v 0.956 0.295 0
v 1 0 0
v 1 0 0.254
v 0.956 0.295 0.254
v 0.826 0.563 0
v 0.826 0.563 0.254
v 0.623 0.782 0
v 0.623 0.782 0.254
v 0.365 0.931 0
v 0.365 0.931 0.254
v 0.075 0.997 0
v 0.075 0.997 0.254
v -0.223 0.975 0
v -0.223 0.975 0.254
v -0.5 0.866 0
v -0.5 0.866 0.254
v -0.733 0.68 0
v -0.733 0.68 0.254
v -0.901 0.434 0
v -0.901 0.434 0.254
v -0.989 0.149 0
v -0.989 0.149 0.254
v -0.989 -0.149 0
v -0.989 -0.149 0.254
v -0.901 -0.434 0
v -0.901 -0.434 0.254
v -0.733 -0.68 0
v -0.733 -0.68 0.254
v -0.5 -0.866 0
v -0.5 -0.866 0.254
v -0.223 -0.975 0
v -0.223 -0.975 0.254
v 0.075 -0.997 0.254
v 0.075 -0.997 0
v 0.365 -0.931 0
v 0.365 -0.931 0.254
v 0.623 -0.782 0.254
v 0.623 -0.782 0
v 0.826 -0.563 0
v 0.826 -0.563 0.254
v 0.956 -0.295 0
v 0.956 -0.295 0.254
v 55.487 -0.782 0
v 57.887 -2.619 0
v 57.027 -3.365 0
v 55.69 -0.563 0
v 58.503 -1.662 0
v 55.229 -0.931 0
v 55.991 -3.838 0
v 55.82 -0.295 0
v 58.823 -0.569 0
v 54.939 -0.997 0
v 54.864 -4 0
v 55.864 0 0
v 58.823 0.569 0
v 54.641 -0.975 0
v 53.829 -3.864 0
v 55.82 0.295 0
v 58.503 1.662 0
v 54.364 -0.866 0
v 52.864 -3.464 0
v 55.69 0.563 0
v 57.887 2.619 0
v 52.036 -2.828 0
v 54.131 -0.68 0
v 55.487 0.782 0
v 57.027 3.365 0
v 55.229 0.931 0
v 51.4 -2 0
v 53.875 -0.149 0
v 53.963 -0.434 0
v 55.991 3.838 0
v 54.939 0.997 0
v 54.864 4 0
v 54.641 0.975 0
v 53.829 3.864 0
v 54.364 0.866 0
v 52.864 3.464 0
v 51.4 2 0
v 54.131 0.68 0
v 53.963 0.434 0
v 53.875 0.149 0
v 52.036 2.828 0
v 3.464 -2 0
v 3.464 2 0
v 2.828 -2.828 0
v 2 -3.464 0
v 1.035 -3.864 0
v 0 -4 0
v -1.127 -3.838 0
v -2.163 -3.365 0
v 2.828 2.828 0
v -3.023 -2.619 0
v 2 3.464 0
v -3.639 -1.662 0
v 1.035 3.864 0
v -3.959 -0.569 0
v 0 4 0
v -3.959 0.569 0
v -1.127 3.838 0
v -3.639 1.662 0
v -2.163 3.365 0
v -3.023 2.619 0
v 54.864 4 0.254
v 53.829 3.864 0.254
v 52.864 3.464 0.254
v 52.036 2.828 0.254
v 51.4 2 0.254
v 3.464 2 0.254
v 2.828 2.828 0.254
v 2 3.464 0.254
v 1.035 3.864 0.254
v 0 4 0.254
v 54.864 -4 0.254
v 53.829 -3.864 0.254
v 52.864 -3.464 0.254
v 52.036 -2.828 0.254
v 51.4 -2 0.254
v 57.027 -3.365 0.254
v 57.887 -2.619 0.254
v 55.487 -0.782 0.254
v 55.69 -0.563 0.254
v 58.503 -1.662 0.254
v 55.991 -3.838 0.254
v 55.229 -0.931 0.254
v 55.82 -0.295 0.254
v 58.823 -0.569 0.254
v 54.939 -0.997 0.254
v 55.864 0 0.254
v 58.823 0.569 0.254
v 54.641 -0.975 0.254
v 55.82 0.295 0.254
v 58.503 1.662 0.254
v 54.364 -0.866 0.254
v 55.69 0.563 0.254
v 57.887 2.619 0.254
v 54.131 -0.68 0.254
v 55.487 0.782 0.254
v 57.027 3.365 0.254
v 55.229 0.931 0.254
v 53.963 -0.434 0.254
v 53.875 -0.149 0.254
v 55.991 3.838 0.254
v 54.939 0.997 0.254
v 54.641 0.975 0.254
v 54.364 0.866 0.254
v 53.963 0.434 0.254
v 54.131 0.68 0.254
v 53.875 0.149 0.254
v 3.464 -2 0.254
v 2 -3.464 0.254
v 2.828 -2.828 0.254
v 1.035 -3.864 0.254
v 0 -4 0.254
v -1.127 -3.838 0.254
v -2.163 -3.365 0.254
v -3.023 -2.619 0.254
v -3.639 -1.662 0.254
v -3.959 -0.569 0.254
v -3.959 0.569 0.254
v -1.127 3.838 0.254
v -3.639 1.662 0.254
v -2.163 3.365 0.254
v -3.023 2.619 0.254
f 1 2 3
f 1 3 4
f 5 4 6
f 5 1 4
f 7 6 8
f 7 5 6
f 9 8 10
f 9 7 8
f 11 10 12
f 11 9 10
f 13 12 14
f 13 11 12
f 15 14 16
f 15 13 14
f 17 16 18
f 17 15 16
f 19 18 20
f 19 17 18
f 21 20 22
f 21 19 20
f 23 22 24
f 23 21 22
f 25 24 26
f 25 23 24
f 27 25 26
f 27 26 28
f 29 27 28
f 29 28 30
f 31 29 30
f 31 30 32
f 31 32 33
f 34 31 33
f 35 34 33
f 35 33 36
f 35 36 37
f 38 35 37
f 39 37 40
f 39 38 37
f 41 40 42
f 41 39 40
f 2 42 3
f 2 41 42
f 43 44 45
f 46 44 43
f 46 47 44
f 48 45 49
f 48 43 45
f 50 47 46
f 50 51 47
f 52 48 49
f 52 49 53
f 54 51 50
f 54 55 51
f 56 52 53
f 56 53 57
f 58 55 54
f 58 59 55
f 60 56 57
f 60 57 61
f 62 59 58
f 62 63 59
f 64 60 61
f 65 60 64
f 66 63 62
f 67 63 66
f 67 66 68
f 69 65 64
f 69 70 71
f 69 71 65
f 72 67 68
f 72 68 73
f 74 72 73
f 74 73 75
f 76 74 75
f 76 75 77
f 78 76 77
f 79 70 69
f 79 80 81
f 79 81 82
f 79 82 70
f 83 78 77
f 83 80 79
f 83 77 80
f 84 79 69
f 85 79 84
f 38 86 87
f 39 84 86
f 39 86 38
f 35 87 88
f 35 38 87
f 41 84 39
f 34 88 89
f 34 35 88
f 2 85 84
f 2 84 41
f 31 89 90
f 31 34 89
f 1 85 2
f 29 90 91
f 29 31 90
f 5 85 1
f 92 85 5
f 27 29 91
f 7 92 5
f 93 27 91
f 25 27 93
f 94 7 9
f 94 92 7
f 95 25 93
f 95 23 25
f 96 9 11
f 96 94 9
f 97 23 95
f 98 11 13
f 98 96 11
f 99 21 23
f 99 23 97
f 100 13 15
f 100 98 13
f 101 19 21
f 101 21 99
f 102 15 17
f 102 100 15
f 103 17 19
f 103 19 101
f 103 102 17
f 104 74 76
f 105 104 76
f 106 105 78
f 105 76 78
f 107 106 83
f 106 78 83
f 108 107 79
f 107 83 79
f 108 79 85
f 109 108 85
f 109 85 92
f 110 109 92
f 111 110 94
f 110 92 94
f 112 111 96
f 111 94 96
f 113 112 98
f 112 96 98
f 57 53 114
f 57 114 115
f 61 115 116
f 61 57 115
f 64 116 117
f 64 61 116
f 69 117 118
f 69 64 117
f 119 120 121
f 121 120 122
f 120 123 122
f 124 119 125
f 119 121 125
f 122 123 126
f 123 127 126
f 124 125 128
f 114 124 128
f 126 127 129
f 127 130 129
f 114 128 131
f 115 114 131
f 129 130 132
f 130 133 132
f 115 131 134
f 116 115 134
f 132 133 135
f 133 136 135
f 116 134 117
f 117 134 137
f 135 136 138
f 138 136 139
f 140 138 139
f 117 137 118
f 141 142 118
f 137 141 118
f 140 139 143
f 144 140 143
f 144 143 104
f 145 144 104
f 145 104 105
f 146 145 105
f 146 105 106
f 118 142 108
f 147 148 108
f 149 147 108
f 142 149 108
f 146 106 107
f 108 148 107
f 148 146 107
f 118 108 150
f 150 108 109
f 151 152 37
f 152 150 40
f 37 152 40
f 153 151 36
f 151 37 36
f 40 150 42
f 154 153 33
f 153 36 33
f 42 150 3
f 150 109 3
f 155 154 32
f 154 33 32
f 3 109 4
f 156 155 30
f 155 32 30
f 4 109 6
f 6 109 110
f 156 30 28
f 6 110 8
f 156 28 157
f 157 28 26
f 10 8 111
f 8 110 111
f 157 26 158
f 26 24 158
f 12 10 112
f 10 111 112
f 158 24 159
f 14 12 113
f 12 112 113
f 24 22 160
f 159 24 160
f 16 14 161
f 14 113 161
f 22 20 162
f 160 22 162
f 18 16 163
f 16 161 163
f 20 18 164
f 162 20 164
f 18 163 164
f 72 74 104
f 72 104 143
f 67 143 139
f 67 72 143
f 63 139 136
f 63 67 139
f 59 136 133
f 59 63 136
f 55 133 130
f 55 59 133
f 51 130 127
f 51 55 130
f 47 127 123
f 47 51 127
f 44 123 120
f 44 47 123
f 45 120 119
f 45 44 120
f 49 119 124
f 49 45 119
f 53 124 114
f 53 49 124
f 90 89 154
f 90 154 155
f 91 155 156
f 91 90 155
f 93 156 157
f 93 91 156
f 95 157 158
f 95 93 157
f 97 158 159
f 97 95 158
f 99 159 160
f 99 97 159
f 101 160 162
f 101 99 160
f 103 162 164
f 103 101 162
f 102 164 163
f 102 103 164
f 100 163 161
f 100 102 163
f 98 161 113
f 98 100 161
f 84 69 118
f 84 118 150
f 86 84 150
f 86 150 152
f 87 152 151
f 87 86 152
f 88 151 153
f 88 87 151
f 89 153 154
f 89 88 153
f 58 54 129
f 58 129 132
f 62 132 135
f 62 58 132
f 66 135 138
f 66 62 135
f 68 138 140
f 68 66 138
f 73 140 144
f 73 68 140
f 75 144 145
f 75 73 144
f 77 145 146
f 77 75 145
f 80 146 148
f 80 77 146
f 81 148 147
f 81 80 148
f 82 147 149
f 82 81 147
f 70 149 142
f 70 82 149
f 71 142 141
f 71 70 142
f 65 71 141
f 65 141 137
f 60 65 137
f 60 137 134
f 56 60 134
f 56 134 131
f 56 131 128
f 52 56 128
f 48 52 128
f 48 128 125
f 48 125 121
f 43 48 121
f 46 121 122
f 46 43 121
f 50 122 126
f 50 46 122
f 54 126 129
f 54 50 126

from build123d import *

# Parameters (mm, degrees)
SKETCH1_R           = 1
BOSS_EXTRUDE1_DEPTH = 0.254
CUT_EXTRUDE1_DEPTH  = 1.254


with BuildPart() as part:
    # Sketch1 → Boss-Extrude1 (new body)
    with BuildSketch(Plane.XY):
        with BuildLine():
            Line((0, 4), (54.864, 4))
            ThreePointArc((54.864, 4), (58.864, 0), (54.864, -4))
            Line((54.864, -4), (0, -4))
            ThreePointArc((0, -4), (-4, 0), (0, 4))
        make_face()
        Circle(SKETCH1_R, mode=Mode.SUBTRACT)
        with Locations((54.864, 0)):
            Circle(SKETCH1_R, mode=Mode.SUBTRACT)
    extrude(amount=BOSS_EXTRUDE1_DEPTH)

    # Sketch2 → Cut-Extrude1 (cut, through all)
    with BuildSketch(Plane(origin=(0, 0, 0), x_dir=(-1, 0, 0), z_dir=(0, 0, -1))):
        with BuildLine():
            Line((-51.399898385, 2), (-3.464101615, 2))
            ThreePointArc((-3.464101615, 2), (-2, 3.464101615), (0, 4))
            Line((0, 4), (-54.864, 4))
            ThreePointArc((-54.864, 4), (-52.864, 3.464101615), (-51.399898385, 2))
        make_face()
        with BuildLine():
            Line((-51.399898385, -2), (-3.464101615, -2))
            ThreePointArc((-3.464101615, -2), (-2, -3.464101615), (0, -4))
            Line((0, -4), (-54.864, -4))
            ThreePointArc((-54.864, -4), (-52.864, -3.464101615), (-51.399898385, -2))
        make_face()
    extrude(amount=-CUT_EXTRUDE1_DEPTH, mode=Mode.SUBTRACT)


solid = part.part
